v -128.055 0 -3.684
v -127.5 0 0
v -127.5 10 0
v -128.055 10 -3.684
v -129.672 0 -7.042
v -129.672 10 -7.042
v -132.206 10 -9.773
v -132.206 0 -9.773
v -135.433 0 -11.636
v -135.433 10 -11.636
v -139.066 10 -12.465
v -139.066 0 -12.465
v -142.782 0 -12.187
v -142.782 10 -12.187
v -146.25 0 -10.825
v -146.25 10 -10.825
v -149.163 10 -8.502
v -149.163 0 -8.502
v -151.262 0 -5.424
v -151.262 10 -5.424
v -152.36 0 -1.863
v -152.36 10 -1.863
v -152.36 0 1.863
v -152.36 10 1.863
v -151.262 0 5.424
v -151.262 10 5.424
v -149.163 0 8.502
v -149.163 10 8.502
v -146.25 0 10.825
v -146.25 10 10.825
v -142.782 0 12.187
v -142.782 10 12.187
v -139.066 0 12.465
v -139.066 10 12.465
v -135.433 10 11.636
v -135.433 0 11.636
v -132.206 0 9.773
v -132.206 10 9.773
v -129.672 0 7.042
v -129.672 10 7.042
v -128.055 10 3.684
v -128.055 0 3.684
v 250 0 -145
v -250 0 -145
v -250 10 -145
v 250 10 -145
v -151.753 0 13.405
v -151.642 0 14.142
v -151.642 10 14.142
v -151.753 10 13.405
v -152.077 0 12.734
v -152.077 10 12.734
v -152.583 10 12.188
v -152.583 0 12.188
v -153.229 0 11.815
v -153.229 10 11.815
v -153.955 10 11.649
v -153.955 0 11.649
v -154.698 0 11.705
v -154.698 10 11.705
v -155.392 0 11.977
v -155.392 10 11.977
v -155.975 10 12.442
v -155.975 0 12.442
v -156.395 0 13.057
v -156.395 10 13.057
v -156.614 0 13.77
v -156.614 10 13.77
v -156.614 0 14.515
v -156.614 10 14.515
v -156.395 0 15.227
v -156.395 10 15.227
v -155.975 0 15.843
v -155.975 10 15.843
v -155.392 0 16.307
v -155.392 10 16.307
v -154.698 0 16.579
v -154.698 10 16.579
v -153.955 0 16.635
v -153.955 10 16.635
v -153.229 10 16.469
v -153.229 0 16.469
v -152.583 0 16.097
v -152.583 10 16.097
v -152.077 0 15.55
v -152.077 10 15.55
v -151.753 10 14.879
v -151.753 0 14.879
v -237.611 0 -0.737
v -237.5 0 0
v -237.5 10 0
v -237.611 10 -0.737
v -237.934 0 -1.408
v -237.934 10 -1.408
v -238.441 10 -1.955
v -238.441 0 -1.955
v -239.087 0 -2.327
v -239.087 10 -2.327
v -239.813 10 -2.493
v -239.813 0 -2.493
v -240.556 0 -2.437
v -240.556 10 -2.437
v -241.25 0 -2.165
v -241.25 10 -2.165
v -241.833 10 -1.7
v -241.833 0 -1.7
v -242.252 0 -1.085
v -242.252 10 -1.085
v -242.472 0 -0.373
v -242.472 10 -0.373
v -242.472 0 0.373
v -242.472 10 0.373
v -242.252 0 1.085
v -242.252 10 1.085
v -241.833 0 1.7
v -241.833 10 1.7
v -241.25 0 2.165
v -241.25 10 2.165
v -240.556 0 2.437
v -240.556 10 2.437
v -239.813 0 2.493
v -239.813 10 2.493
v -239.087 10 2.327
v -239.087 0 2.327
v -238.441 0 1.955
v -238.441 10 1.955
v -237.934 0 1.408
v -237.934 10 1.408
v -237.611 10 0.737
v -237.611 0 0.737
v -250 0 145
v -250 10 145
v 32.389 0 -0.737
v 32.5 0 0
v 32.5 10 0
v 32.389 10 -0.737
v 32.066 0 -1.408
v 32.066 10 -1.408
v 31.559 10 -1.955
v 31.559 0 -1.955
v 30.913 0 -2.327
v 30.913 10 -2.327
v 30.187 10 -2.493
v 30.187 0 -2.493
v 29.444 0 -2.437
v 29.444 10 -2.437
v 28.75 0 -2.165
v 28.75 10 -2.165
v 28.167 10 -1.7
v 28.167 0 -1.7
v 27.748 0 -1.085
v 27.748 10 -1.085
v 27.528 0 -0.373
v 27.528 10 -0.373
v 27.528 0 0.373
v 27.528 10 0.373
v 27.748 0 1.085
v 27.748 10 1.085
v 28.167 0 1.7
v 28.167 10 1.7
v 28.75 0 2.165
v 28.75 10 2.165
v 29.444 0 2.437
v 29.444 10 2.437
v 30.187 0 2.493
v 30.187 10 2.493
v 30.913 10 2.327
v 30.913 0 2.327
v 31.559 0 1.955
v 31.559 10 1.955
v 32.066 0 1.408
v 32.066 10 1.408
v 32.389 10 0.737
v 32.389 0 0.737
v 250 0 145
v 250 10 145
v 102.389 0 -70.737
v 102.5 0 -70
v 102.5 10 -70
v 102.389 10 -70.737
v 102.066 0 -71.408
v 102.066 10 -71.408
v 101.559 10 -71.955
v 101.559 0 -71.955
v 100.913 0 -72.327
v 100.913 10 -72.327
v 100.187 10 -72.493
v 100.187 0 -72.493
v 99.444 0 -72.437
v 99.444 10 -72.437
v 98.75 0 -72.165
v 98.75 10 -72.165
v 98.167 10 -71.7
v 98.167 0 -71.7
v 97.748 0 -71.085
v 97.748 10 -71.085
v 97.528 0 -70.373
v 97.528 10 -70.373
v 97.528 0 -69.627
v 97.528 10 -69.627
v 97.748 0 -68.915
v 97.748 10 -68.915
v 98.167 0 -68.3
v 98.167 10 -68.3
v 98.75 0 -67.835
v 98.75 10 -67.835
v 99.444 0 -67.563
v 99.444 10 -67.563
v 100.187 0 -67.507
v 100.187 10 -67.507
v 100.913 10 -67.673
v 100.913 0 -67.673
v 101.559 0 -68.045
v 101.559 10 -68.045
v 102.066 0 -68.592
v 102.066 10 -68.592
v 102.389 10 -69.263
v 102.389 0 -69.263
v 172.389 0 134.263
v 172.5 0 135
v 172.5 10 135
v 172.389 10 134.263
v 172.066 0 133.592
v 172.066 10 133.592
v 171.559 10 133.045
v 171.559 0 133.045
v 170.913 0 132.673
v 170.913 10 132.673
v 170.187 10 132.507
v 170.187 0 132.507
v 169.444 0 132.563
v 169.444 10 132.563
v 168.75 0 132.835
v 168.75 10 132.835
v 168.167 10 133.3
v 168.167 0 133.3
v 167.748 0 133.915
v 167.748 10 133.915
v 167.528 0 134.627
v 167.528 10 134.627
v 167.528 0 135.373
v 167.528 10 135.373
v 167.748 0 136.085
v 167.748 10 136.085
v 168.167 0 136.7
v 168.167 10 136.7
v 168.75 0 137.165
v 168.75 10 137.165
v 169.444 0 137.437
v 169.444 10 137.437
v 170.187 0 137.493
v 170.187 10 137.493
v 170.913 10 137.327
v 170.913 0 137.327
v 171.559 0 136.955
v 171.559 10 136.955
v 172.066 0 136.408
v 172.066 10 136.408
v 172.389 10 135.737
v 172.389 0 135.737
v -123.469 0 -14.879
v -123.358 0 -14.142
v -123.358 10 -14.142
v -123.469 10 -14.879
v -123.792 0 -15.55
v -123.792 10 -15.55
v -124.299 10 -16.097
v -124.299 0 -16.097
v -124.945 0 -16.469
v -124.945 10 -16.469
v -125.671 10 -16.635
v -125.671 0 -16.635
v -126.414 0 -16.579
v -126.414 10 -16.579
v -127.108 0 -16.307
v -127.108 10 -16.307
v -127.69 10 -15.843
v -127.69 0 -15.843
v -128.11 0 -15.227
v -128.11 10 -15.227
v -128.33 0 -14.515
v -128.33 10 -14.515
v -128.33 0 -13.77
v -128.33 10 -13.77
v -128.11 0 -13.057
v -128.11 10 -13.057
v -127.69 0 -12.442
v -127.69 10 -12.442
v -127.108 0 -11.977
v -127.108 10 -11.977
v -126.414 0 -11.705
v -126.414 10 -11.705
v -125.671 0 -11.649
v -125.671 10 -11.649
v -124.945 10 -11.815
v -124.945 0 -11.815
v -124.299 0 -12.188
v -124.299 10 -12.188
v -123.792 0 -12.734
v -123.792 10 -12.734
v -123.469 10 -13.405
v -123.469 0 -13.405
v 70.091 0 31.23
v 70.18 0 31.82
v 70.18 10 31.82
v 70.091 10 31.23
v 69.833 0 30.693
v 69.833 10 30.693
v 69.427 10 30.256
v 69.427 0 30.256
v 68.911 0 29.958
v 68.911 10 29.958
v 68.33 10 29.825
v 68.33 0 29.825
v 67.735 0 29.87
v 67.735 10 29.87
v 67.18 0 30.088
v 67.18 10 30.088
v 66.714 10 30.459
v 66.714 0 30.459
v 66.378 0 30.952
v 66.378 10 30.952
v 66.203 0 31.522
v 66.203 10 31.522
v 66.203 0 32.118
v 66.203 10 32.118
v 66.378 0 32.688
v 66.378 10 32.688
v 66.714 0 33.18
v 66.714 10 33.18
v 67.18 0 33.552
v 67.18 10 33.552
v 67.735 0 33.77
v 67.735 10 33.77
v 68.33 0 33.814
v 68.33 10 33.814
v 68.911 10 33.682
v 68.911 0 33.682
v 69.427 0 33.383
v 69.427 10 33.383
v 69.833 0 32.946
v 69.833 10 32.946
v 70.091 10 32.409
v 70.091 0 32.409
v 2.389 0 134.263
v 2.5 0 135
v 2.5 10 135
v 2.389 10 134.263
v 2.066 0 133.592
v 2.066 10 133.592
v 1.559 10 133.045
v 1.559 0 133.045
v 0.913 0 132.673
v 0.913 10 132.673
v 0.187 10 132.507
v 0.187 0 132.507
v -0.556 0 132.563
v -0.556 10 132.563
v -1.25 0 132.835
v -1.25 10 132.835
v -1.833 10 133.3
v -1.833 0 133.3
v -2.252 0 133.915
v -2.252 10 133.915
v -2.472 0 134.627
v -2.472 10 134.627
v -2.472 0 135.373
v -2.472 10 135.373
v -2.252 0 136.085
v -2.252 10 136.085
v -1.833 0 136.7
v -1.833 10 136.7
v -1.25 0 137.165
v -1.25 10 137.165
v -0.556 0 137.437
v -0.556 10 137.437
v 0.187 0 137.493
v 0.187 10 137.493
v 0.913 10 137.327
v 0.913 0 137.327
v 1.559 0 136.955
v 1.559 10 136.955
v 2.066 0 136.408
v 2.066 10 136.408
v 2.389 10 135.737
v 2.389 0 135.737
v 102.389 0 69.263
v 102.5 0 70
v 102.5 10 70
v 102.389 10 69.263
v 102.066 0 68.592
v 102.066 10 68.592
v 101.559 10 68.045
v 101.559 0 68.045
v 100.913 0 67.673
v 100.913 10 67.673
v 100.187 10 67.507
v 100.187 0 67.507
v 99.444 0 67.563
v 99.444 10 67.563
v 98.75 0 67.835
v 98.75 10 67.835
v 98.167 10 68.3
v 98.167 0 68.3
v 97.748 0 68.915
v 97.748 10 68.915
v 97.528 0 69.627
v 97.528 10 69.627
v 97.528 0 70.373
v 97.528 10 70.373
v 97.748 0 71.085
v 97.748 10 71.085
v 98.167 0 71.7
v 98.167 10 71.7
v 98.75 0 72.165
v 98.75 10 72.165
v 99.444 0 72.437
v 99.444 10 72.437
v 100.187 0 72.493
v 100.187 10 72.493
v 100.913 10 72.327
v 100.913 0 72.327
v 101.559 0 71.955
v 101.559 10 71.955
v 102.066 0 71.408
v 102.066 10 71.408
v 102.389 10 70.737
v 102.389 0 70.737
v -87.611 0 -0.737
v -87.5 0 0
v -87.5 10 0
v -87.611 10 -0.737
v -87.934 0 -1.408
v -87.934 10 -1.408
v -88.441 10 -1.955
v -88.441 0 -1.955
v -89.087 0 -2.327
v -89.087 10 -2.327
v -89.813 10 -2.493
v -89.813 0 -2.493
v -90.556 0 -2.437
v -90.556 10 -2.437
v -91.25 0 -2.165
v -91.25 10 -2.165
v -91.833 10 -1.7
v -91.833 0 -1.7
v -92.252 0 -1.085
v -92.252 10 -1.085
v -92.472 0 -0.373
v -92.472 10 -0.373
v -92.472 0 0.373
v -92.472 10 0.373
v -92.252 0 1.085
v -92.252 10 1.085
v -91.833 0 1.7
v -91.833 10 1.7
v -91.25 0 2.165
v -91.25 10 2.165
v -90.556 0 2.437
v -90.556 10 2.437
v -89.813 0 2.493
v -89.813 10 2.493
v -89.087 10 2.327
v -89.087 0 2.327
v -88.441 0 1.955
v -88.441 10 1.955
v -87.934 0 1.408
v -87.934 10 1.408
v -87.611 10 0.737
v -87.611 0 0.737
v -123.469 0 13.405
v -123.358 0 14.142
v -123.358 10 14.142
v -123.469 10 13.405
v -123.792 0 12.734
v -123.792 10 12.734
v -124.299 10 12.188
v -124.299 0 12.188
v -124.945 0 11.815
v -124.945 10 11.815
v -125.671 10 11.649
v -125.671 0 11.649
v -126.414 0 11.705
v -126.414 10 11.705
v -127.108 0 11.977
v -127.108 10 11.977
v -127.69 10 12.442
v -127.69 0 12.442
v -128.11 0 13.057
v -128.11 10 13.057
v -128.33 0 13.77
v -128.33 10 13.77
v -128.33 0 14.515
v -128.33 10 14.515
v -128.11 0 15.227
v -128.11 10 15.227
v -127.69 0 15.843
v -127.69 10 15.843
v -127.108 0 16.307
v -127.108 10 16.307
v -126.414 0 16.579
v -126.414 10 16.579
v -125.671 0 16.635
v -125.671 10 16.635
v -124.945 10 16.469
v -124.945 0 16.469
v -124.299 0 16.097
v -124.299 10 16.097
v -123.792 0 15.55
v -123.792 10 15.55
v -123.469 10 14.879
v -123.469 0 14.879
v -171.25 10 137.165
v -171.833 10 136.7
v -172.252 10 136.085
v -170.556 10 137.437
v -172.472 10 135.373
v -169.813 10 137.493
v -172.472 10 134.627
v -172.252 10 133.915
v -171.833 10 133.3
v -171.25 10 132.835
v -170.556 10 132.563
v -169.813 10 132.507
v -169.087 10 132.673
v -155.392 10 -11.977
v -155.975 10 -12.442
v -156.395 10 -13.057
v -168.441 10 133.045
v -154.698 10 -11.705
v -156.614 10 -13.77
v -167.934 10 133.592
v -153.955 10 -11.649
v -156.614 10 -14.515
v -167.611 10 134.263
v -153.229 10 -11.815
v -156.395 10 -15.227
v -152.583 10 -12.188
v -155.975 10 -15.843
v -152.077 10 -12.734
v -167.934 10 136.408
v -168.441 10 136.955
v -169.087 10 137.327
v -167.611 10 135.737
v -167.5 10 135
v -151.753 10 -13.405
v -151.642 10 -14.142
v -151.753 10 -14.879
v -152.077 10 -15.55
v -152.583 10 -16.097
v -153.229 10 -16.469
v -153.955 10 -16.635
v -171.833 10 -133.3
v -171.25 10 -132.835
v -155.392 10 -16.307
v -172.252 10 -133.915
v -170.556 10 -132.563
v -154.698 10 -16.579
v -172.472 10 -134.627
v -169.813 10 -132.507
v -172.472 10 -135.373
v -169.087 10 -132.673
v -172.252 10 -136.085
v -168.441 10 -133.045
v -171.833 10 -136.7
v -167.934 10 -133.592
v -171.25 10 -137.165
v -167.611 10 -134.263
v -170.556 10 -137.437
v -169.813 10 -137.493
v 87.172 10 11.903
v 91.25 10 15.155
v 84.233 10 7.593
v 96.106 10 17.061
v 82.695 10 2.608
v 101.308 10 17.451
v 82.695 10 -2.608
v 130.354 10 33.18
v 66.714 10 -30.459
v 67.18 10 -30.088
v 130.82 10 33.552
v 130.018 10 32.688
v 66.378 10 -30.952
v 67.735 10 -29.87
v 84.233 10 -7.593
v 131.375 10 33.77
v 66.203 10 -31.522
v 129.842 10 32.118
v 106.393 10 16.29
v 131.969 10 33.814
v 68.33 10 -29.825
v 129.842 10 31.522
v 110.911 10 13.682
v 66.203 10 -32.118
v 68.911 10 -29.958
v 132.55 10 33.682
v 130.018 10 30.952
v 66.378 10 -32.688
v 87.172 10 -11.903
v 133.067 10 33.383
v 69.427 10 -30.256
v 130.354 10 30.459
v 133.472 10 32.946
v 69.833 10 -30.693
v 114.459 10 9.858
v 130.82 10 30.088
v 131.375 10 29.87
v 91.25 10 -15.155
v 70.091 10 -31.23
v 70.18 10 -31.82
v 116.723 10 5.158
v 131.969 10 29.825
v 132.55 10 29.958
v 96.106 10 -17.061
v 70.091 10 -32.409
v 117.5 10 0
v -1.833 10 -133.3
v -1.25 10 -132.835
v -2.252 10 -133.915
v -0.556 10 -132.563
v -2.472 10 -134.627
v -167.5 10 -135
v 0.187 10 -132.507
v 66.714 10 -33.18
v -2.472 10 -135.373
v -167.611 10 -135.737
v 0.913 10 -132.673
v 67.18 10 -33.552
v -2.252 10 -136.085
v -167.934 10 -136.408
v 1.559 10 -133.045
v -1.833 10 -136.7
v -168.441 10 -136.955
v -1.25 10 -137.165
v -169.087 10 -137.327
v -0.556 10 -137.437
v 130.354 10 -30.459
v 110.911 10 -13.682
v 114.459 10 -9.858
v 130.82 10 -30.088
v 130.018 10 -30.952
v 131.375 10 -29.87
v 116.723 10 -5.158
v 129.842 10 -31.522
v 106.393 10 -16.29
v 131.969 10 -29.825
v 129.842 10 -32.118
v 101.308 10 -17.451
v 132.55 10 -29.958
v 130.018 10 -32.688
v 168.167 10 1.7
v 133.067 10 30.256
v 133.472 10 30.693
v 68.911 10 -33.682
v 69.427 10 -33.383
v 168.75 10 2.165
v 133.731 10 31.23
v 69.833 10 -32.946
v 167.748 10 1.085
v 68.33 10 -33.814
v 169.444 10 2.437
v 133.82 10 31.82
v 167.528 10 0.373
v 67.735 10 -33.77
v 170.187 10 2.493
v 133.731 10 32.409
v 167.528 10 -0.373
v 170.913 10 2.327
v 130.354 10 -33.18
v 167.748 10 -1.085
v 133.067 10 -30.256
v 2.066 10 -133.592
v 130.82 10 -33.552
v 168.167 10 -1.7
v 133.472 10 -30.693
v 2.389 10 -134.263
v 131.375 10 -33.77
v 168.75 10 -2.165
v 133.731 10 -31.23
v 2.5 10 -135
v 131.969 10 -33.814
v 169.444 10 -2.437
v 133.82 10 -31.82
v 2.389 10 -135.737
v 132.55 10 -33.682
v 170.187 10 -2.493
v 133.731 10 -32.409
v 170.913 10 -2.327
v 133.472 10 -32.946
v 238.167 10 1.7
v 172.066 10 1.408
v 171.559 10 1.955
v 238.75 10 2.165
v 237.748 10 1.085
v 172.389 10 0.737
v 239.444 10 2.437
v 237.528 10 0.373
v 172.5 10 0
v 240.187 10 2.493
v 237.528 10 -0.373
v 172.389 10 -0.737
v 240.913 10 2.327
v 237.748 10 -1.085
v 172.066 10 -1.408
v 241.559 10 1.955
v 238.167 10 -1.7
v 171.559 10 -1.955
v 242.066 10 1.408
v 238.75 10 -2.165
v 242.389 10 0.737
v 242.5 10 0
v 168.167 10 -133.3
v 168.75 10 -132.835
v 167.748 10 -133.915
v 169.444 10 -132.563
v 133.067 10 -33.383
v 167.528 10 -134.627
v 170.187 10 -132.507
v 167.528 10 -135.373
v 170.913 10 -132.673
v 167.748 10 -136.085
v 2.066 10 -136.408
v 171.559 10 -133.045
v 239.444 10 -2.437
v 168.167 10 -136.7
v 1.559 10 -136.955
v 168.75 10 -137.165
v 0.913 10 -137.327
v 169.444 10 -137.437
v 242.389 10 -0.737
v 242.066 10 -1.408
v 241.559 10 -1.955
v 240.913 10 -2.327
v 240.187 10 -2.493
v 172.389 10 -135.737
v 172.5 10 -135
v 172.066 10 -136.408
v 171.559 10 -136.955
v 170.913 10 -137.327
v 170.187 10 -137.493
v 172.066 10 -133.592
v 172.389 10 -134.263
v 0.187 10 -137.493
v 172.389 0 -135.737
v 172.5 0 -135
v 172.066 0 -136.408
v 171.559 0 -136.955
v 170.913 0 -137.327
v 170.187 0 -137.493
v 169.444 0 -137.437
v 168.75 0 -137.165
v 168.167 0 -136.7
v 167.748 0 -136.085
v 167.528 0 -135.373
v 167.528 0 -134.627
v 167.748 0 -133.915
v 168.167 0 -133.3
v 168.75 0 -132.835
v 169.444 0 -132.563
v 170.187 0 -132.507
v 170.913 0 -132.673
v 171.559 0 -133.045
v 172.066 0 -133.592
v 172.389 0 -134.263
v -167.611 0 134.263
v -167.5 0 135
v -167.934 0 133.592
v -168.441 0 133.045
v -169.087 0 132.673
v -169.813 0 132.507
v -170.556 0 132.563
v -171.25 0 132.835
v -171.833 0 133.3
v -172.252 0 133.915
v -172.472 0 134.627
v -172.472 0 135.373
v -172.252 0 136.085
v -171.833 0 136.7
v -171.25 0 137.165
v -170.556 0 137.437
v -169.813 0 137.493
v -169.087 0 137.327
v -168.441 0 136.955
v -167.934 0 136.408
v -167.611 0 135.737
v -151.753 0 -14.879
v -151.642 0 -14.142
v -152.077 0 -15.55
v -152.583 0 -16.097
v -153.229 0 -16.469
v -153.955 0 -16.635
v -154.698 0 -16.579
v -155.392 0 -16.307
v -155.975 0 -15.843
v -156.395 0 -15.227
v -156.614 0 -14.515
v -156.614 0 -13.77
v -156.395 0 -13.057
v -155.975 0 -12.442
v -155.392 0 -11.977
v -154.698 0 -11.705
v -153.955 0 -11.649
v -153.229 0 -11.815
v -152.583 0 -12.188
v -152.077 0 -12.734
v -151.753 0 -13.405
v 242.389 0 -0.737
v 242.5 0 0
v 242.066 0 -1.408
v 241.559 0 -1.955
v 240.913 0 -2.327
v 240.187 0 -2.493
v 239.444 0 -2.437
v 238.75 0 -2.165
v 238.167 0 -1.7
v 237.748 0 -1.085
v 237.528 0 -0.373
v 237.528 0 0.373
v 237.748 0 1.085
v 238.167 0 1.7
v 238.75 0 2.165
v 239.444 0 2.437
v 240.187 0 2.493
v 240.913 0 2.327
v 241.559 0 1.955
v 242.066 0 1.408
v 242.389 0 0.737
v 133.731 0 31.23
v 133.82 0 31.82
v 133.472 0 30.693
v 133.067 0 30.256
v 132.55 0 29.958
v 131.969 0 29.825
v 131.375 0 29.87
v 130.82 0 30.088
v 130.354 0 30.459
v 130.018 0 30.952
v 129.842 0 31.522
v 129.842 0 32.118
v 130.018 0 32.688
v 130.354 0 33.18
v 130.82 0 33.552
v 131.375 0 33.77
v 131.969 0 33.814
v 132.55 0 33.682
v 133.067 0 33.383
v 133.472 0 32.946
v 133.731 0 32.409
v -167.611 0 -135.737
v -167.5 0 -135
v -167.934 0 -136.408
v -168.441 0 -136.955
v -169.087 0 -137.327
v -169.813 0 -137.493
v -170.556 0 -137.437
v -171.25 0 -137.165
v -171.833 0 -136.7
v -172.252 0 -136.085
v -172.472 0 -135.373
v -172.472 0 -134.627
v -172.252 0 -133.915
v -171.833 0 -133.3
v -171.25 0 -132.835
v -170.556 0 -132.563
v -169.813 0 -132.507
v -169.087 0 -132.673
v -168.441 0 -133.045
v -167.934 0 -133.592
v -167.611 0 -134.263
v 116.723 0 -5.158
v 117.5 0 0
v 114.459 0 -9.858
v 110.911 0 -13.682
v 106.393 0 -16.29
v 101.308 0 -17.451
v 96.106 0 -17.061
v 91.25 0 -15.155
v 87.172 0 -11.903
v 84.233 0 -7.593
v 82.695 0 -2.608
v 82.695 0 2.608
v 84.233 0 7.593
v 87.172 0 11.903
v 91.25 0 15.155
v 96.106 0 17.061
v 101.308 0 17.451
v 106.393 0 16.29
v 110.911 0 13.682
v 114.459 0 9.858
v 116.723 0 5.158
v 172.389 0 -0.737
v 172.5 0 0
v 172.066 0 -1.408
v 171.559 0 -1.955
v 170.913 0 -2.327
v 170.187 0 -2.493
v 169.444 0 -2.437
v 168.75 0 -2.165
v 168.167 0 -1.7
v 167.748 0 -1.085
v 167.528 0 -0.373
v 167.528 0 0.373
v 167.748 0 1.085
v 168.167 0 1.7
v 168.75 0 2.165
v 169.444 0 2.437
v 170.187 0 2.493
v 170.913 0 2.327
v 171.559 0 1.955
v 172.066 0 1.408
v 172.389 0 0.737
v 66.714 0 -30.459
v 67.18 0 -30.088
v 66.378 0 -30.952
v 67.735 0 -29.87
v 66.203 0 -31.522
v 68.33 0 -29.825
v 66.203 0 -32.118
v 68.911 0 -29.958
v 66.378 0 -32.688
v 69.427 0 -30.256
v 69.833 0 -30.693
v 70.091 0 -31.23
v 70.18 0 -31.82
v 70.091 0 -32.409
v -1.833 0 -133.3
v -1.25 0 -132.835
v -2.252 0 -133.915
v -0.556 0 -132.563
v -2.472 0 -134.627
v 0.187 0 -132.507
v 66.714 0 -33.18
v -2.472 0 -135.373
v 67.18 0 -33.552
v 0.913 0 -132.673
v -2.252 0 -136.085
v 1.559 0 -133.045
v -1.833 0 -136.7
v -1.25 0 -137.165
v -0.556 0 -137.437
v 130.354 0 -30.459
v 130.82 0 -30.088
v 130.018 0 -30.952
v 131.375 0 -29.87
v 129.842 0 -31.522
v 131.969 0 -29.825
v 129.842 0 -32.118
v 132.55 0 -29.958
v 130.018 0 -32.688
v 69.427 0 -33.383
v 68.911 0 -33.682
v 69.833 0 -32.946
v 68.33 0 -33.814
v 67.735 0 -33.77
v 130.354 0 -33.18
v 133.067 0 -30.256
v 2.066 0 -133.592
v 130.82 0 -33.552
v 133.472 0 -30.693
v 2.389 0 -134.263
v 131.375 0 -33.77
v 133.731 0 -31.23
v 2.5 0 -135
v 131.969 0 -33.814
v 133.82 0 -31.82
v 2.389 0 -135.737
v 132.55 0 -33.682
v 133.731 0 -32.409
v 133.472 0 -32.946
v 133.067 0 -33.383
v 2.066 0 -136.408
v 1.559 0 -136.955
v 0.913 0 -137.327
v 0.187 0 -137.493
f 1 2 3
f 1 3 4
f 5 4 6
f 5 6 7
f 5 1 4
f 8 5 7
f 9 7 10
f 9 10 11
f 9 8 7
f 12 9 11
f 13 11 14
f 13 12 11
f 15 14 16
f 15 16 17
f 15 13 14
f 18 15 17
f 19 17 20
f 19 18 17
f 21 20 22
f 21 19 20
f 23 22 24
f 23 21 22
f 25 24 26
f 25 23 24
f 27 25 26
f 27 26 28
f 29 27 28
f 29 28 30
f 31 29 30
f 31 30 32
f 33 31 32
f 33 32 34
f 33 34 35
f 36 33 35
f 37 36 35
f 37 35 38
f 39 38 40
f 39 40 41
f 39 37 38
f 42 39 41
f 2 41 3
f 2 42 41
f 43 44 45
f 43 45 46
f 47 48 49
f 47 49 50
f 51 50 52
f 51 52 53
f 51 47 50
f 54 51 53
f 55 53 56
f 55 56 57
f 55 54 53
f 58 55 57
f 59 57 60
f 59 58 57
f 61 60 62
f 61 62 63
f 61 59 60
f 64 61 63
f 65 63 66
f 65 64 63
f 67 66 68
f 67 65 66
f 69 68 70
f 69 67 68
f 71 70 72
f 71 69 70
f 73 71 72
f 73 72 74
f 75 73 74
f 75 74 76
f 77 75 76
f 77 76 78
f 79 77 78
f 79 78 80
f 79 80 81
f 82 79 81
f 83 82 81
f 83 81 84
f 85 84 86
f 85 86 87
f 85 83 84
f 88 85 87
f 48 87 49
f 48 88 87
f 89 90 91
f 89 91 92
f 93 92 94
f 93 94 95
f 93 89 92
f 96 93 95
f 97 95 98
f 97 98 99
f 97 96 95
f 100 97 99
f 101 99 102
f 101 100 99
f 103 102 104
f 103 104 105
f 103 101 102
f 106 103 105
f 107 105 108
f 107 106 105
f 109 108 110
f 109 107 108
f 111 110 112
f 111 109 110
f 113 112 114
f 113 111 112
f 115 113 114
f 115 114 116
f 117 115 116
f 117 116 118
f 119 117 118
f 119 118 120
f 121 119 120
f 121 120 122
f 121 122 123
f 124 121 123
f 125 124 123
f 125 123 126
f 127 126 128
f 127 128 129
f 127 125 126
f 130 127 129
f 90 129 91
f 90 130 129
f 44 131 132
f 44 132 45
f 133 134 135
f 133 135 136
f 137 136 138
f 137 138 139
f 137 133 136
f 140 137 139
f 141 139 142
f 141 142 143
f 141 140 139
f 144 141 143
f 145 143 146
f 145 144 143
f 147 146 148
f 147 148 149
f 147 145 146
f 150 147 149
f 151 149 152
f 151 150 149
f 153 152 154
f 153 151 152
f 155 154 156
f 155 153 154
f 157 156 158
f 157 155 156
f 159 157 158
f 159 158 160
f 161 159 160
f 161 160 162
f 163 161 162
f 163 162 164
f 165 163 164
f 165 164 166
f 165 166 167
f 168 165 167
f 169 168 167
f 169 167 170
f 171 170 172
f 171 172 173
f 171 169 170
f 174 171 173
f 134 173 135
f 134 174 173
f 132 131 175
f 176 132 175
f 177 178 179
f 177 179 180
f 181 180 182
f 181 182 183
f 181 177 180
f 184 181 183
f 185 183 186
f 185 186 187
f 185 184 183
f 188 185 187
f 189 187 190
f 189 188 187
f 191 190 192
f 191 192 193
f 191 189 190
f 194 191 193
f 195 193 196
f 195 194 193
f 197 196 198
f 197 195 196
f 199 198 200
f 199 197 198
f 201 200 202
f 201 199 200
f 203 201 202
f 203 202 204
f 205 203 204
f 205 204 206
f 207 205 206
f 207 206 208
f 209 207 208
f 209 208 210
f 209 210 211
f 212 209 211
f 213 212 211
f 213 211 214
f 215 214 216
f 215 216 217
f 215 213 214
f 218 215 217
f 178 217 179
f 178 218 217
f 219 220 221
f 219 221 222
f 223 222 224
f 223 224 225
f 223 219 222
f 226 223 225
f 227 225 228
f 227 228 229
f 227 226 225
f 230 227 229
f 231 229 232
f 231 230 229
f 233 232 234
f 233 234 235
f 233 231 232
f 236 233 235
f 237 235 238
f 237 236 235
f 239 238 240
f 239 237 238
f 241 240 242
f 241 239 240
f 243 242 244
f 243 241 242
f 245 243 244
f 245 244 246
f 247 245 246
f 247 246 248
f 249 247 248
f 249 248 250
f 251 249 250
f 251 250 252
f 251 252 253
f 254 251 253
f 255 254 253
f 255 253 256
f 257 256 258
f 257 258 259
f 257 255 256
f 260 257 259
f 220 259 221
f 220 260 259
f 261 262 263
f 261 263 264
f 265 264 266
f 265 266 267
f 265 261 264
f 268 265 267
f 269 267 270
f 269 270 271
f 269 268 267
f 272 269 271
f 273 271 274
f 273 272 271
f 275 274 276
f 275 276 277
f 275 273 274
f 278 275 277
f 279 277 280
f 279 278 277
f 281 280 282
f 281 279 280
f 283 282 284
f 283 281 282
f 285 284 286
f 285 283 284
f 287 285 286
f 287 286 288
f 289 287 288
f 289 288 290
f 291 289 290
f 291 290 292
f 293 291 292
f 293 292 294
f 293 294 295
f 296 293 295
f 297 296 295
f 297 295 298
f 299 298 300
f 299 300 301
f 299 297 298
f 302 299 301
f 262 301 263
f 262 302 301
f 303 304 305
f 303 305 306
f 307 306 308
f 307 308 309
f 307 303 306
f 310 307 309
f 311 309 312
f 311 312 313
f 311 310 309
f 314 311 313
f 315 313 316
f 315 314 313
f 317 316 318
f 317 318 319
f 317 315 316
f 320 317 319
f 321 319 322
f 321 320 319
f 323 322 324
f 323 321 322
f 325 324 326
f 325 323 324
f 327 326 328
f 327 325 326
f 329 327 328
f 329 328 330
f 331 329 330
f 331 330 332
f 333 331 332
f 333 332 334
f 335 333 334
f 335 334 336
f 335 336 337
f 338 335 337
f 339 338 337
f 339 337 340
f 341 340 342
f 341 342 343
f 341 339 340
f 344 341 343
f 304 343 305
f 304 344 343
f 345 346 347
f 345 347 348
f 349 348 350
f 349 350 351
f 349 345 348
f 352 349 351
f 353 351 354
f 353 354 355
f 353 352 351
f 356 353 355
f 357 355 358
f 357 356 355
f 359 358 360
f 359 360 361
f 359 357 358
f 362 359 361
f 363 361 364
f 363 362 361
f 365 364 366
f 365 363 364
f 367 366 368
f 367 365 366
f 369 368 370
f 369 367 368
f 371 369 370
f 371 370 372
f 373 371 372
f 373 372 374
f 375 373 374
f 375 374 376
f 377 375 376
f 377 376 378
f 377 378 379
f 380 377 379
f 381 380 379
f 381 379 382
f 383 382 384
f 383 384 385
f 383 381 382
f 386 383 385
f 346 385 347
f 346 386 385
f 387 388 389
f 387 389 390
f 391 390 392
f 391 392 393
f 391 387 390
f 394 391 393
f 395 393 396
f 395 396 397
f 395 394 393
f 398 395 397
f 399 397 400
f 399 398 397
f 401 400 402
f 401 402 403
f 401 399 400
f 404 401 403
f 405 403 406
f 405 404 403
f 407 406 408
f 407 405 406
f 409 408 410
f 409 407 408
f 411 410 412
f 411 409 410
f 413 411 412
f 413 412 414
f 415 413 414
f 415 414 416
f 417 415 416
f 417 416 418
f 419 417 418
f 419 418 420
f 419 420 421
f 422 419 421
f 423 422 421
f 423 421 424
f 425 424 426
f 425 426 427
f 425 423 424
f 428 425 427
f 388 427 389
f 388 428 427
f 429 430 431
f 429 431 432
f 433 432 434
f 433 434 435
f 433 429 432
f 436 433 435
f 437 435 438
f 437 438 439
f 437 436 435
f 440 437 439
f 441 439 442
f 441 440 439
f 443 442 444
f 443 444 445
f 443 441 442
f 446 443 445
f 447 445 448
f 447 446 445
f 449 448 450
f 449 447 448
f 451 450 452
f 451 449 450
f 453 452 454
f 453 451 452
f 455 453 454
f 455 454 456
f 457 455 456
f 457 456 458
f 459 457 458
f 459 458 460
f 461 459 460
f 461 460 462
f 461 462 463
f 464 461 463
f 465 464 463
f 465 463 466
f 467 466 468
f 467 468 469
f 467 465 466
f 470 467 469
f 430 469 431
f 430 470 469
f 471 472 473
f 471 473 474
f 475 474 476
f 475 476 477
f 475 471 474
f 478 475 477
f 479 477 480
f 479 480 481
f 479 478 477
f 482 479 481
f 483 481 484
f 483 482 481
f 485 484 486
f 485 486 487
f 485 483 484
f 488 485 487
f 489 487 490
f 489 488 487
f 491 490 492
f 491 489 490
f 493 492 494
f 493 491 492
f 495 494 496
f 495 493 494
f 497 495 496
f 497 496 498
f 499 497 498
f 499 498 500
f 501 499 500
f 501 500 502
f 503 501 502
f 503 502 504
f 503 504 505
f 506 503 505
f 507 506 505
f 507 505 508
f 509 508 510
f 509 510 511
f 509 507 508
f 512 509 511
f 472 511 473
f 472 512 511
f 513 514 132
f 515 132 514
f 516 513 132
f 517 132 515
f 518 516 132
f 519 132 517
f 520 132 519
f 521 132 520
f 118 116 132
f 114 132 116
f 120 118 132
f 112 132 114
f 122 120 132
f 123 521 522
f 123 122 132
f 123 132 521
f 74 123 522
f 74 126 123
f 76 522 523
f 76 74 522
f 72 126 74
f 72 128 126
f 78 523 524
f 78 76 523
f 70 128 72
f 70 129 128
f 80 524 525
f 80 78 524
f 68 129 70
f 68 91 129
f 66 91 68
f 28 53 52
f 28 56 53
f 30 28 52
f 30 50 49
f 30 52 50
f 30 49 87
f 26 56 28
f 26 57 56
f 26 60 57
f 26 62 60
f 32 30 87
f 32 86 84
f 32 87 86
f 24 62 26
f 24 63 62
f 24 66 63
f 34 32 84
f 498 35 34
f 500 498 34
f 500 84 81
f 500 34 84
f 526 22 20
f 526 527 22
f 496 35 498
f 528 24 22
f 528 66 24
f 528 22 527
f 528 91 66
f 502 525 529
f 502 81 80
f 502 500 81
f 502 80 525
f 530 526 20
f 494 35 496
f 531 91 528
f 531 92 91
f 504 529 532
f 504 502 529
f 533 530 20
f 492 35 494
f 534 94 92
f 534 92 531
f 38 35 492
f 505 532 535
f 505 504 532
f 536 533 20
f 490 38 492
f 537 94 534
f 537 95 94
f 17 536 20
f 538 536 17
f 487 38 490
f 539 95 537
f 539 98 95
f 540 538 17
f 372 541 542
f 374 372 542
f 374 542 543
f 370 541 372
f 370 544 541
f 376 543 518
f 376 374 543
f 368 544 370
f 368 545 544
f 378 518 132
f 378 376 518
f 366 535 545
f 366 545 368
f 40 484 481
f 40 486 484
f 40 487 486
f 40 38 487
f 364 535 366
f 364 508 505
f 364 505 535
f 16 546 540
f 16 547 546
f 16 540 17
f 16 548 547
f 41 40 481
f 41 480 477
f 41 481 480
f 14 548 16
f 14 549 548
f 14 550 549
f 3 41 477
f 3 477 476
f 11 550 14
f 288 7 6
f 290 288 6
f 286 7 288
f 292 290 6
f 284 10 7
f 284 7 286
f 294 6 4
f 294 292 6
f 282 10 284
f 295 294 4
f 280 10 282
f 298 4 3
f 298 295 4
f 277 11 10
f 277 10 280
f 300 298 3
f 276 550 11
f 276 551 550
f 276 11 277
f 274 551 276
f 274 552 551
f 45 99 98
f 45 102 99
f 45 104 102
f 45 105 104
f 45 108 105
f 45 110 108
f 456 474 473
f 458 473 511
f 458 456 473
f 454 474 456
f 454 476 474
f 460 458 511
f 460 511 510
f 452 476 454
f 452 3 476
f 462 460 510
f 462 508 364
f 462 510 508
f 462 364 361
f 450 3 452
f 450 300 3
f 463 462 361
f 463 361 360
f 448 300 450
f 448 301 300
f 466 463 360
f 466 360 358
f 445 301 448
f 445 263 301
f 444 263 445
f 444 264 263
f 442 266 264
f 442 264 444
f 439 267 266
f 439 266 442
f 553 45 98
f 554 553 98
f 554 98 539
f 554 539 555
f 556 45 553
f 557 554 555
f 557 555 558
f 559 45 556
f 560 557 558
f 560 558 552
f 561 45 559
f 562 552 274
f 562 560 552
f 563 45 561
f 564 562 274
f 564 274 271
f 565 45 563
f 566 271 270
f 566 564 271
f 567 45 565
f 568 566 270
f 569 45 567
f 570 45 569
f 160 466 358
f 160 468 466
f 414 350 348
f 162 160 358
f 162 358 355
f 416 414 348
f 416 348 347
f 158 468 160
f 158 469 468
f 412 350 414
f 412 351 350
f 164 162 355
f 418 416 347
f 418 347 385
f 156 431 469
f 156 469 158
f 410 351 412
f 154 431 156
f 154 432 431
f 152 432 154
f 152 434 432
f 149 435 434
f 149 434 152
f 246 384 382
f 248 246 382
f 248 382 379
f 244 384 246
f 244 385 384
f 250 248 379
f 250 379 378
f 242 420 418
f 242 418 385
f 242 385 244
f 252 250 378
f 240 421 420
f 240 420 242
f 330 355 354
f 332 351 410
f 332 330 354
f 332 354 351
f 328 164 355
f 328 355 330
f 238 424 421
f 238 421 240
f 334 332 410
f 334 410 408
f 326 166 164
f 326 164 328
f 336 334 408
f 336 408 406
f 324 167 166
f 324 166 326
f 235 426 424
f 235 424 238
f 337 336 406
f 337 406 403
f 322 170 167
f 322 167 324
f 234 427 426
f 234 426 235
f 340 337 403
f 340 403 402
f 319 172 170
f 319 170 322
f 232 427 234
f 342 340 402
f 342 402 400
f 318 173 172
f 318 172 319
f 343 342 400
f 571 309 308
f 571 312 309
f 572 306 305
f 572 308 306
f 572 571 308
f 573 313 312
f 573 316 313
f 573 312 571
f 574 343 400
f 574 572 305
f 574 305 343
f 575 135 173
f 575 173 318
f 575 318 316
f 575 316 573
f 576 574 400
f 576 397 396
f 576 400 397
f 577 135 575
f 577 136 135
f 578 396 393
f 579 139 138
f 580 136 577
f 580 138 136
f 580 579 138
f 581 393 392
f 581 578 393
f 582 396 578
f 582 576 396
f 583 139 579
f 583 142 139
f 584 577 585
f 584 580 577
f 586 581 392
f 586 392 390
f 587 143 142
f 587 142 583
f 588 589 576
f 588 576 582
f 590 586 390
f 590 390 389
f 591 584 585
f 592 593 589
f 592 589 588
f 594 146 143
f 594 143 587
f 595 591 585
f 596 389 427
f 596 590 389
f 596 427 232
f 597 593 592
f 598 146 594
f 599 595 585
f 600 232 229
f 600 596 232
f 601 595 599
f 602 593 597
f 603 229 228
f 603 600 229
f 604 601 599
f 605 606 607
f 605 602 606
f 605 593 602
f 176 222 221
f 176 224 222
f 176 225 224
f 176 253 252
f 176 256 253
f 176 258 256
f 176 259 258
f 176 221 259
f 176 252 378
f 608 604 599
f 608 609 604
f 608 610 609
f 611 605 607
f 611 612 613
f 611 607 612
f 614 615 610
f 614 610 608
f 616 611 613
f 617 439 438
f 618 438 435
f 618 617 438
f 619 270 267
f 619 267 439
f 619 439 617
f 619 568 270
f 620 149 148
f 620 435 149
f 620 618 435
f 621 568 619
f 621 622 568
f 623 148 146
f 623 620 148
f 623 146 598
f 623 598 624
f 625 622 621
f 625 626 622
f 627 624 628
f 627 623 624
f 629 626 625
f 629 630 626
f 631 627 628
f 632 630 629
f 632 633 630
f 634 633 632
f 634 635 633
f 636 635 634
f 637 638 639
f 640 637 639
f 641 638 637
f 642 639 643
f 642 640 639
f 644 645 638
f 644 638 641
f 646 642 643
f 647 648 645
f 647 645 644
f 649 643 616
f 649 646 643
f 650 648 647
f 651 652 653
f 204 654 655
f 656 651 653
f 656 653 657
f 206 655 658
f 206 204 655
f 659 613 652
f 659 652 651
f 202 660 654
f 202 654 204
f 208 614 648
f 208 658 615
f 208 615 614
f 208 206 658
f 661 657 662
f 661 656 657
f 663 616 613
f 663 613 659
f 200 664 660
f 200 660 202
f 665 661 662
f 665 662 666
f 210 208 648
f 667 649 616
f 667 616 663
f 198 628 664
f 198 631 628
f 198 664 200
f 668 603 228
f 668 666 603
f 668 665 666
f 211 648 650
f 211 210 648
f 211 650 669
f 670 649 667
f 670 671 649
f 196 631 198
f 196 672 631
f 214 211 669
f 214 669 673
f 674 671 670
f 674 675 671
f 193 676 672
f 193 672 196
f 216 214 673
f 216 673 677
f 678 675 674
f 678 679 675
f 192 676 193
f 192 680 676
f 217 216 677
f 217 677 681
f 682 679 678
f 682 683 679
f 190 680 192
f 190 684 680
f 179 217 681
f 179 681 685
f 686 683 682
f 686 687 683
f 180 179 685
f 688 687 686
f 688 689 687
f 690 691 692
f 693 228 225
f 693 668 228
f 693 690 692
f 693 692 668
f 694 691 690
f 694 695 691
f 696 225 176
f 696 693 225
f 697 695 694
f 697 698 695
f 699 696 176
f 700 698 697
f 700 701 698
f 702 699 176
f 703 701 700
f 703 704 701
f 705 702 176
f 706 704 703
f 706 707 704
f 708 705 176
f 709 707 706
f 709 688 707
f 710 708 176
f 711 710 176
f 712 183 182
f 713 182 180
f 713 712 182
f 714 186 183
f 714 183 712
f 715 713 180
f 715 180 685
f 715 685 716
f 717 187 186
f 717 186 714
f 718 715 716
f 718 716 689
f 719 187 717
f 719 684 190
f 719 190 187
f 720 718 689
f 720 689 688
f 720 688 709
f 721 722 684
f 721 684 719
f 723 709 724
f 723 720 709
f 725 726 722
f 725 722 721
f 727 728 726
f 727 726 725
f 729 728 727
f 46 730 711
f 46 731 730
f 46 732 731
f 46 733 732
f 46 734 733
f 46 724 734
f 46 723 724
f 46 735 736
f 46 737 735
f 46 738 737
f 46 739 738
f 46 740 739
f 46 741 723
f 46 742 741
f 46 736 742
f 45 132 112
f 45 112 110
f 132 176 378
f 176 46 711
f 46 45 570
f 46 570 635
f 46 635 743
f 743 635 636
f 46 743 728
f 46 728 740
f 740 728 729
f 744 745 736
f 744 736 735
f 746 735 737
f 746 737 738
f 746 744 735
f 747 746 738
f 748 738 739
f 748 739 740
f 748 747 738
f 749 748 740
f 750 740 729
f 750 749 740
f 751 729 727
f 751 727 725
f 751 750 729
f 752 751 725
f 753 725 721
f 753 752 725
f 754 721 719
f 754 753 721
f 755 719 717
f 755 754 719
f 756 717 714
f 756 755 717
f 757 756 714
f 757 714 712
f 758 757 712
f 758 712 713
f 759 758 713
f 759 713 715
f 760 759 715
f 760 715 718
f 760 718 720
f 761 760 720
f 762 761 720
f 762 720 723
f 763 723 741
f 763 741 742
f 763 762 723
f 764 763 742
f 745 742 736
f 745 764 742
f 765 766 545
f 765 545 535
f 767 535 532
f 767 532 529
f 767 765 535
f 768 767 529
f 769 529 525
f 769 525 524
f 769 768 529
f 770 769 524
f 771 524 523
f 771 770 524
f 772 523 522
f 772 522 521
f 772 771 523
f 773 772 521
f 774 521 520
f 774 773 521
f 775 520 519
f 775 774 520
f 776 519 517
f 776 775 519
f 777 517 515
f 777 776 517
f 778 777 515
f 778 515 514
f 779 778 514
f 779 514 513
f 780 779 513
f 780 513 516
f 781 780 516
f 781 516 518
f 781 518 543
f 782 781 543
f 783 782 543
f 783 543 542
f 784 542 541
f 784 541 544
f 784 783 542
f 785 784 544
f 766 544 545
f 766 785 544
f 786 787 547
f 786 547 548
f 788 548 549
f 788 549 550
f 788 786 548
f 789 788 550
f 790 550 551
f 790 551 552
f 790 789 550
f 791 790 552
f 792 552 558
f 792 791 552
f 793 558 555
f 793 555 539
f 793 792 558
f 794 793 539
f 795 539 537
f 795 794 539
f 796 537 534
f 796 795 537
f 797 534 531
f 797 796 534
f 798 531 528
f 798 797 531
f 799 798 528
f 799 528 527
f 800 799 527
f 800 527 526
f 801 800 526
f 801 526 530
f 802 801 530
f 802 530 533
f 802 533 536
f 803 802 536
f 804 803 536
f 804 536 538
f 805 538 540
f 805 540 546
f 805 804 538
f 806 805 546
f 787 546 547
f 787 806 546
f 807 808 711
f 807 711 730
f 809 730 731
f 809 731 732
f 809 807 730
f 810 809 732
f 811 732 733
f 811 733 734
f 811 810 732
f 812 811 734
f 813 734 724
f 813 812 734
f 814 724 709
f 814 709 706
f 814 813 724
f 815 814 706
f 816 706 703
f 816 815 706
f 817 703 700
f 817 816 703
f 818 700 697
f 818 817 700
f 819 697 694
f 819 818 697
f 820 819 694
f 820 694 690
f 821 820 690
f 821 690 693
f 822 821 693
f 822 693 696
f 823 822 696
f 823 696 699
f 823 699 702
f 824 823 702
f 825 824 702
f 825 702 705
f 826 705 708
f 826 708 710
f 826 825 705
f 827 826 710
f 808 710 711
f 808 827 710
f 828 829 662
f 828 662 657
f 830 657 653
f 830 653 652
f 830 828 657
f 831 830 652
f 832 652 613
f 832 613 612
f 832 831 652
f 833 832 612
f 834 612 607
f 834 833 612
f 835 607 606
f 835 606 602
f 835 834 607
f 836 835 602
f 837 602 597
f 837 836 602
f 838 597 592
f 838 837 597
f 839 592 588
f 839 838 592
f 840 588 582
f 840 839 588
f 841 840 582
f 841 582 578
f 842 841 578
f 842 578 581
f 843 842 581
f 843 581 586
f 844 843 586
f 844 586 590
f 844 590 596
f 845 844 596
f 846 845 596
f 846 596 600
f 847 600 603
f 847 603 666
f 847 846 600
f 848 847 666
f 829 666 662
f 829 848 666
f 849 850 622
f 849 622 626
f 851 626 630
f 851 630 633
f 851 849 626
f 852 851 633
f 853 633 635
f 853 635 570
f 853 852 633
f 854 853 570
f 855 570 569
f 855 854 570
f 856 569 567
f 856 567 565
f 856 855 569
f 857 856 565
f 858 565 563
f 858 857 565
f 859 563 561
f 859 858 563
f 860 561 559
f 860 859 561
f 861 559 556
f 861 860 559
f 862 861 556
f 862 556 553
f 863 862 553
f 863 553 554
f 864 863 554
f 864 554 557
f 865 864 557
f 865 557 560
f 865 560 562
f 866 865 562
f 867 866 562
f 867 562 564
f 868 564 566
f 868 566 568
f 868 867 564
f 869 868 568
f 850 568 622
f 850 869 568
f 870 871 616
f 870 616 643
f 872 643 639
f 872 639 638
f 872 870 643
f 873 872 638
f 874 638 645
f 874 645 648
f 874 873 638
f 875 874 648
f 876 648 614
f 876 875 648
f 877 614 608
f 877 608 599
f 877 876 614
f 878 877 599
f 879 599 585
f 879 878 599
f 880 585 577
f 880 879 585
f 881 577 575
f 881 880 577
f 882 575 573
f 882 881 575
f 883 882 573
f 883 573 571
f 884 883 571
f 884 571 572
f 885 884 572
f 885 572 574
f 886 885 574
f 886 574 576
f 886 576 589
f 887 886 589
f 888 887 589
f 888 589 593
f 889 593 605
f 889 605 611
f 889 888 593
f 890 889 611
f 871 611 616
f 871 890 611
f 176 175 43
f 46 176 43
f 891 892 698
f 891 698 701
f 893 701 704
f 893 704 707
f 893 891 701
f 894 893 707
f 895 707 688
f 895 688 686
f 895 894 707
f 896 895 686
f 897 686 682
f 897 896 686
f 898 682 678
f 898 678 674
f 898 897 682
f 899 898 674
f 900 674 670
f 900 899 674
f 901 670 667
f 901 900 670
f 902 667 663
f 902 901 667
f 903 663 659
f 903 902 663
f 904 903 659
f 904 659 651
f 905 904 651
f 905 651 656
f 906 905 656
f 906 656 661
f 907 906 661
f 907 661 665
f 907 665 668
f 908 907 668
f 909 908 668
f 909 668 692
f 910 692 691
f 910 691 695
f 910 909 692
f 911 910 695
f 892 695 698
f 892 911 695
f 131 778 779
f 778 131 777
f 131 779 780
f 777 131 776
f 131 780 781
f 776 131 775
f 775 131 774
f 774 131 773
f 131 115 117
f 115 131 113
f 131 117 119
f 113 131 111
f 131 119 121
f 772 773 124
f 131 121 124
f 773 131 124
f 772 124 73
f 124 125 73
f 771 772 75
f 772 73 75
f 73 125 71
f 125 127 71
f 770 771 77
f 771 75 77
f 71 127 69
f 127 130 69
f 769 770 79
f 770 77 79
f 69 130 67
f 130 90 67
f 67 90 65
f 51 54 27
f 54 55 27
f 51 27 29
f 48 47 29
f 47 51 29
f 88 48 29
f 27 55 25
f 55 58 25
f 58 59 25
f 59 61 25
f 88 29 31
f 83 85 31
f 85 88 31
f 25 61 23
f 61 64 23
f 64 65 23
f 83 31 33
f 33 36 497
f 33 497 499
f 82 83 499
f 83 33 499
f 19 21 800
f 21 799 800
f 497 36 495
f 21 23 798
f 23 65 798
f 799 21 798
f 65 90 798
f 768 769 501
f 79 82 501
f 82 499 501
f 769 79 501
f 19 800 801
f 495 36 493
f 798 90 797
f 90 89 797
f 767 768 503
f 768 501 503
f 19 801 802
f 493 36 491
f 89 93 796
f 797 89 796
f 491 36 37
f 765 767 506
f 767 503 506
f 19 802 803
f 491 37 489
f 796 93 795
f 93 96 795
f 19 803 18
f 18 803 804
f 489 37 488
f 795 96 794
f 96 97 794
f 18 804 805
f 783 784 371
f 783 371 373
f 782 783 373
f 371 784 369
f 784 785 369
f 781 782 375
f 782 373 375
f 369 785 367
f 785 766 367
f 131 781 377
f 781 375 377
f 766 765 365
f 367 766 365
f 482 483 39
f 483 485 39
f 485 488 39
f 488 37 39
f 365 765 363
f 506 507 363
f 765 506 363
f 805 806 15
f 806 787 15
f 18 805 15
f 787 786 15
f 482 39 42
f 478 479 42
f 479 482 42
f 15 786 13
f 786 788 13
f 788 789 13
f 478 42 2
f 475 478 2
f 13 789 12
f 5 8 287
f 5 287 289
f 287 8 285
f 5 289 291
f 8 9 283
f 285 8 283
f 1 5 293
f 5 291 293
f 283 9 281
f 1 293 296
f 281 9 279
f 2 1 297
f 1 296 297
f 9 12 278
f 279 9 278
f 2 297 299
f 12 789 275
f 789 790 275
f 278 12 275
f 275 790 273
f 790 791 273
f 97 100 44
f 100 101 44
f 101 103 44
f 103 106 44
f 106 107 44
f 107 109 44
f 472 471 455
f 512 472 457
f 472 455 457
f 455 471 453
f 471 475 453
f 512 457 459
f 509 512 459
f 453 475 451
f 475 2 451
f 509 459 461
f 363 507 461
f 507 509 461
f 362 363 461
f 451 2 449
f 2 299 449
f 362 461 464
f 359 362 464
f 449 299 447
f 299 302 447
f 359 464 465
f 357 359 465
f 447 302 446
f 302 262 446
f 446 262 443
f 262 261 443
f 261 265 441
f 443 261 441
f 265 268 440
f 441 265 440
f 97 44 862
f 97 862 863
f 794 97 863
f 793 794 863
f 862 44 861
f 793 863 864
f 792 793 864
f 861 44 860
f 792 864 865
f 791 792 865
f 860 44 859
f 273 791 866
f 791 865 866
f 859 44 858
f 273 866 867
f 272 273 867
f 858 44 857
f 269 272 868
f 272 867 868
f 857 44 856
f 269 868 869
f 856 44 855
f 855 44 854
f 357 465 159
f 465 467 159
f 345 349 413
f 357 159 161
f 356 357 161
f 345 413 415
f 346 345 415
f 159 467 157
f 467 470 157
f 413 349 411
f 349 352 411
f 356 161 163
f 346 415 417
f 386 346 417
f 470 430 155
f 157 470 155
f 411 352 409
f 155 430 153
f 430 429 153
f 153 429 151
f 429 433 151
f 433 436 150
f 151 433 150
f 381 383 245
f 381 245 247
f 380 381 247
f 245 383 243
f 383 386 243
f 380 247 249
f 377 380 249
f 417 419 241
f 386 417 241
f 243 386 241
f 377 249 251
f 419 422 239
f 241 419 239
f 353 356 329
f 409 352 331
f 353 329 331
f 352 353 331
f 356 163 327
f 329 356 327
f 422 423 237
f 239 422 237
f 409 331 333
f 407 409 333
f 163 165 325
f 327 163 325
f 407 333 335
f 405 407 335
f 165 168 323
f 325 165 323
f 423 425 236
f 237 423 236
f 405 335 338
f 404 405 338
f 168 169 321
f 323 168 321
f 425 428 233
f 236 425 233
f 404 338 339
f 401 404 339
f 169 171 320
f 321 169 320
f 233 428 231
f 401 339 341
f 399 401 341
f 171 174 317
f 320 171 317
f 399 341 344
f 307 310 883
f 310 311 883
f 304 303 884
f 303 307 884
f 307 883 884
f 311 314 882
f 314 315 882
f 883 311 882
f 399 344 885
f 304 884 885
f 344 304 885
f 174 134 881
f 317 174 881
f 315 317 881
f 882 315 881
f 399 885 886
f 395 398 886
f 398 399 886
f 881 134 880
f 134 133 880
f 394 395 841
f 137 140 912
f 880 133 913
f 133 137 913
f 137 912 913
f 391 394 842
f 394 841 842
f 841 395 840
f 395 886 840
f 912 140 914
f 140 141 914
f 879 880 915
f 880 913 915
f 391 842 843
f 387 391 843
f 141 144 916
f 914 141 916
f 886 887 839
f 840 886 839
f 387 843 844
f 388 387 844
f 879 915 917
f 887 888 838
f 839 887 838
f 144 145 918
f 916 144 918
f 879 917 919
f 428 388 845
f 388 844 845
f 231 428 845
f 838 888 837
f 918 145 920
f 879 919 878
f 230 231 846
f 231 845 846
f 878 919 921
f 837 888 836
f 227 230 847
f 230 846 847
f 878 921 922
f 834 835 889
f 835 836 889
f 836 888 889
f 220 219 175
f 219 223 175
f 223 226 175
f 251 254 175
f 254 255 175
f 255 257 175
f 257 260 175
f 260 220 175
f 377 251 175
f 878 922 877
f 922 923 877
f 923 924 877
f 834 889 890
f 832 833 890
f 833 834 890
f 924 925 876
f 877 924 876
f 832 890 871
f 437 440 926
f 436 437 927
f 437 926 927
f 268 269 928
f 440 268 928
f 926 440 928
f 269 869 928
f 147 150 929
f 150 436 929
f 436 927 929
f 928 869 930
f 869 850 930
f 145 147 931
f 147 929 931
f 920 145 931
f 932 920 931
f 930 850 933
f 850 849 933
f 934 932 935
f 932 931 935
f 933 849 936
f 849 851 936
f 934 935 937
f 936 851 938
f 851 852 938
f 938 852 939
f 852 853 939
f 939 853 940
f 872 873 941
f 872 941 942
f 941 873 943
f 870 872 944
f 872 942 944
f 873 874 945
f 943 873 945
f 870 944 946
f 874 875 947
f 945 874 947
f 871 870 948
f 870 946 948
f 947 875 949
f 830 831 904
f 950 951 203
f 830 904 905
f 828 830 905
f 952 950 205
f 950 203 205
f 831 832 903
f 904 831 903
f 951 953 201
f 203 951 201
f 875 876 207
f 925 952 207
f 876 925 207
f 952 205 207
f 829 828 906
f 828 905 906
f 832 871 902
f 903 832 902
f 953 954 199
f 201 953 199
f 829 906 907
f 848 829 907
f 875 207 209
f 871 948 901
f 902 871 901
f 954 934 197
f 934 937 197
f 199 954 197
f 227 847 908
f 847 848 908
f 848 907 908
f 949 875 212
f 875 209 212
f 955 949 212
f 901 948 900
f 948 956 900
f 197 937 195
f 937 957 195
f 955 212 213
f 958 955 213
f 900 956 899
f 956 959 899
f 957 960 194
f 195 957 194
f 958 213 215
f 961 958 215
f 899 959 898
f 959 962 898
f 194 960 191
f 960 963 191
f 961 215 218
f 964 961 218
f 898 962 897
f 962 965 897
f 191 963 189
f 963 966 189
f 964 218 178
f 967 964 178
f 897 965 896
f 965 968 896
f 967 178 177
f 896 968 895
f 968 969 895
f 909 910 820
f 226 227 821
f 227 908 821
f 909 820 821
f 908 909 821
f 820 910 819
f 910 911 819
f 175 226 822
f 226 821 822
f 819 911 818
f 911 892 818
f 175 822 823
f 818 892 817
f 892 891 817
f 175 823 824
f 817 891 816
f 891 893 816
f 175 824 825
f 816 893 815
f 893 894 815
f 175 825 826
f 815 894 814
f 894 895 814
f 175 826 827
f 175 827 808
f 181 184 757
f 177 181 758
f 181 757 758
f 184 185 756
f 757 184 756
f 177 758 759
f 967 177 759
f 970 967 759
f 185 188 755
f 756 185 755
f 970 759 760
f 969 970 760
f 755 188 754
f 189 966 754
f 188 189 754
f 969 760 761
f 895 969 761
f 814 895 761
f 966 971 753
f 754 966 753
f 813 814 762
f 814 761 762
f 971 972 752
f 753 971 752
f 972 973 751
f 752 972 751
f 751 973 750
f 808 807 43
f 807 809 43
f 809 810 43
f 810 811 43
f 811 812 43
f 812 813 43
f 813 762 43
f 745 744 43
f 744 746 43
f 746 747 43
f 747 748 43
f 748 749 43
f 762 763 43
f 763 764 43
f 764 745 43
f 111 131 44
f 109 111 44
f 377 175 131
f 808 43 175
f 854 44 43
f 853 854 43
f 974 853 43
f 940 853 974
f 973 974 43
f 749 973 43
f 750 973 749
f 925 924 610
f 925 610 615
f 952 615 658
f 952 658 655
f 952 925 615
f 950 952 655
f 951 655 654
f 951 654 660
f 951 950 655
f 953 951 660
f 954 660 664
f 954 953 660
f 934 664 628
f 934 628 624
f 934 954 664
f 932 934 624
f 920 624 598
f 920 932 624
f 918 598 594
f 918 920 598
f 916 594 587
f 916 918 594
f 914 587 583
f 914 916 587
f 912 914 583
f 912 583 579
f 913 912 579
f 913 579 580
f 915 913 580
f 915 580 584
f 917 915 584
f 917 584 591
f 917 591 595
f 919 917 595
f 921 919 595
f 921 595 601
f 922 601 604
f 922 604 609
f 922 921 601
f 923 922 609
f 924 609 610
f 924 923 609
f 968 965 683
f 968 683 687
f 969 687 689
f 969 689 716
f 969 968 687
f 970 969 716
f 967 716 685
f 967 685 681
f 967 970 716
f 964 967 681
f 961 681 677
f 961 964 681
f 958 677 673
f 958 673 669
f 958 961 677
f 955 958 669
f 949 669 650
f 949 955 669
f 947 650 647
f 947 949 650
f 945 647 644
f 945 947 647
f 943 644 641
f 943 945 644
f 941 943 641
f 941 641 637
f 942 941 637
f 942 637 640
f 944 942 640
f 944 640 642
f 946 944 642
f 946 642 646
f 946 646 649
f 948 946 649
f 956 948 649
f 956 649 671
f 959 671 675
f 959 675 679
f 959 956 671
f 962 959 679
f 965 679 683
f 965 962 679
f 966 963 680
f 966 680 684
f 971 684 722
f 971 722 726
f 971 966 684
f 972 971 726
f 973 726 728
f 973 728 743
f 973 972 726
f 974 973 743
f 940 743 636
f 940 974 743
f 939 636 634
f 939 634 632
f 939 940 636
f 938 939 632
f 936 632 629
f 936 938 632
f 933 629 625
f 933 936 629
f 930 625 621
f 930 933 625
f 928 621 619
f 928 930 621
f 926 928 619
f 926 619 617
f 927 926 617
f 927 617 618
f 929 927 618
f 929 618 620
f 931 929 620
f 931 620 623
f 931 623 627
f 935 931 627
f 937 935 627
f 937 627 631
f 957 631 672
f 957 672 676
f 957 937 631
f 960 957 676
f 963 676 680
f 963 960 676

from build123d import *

# Parameters (mm, degrees)
SKETCH1_W           = 500
SKETCH1_H           = 290
SKETCH1_R           = 2.5
SKETCH1_R_2         = 17.5
SKETCH1_R_3         = 12.5
SKETCH1_R_4         = 2
BOSS_EXTRUDE1_DEPTH = 10


with BuildPart() as part:
    # Sketch1 → Boss-Extrude1 (new body)
    with BuildSketch(Plane(origin=(0, 0, 0), x_dir=(1, 0, 0), z_dir=(0, 1, 0))):
        Rectangle(SKETCH1_W, SKETCH1_H)
        with Locations((-240, 0)):
            Circle(SKETCH1_R, mode=Mode.SUBTRACT)
        with Locations((-90, 0)):
            Circle(SKETCH1_R, mode=Mode.SUBTRACT)
        with Locations((-170, -135)):
            Circle(SKETCH1_R, mode=Mode.SUBTRACT)
        with Locations((-170, 135)):
            Circle(SKETCH1_R, mode=Mode.SUBTRACT)
        with Locations((170, 135)):
            Circle(SKETCH1_R, mode=Mode.SUBTRACT)
        with Locations((240, 0)):
            Circle(SKETCH1_R, mode=Mode.SUBTRACT)
        with Locations((170, -135)):
            Circle(SKETCH1_R, mode=Mode.SUBTRACT)
        with Locations((0, 135)):
            Circle(SKETCH1_R, mode=Mode.SUBTRACT)
        with Locations((0, -135)):
            Circle(SKETCH1_R, mode=Mode.SUBTRACT)
        with Locations((100, 0)):
            Circle(SKETCH1_R_2, mode=Mode.SUBTRACT)
        with Locations((-140, 0)):
            Circle(SKETCH1_R_3, mode=Mode.SUBTRACT)
        with Locations((-125.857864376, 14.142135624)):
            Circle(SKETCH1_R, mode=Mode.SUBTRACT)
        with Locations((-125.857864376, -14.142135624)):
            Circle(SKETCH1_R, mode=Mode.SUBTRACT)
        with Locations((-154.142135624, -14.142135624)):
            Circle(SKETCH1_R, mode=Mode.SUBTRACT)
        with Locations((-154.142135624, 14.142135624)):
            Circle(SKETCH1_R, mode=Mode.SUBTRACT)
        with Locations((170, 0)):
            Circle(SKETCH1_R, mode=Mode.SUBTRACT)
        with Locations((131.819805153, 31.819805153)):
            Circle(SKETCH1_R_4, mode=Mode.SUBTRACT)
        with Locations((100, -70)):
            Circle(SKETCH1_R, mode=Mode.SUBTRACT)
        with Locations((30, 0)):
            Circle(SKETCH1_R, mode=Mode.SUBTRACT)
        with Locations((100, 70)):
            Circle(SKETCH1_R, mode=Mode.SUBTRACT)
        with Locations((131.819805153, -31.819805153)):
            Circle(SKETCH1_R_4, mode=Mode.SUBTRACT)
        with Locations((68.180194847, -31.819805153)):
            Circle(SKETCH1_R_4, mode=Mode.SUBTRACT)
        with Locations((68.180194847, 31.819805153)):
            Circle(SKETCH1_R_4, mode=Mode.SUBTRACT)
    extrude(amount=BOSS_EXTRUDE1_DEPTH)


solid = part.part
